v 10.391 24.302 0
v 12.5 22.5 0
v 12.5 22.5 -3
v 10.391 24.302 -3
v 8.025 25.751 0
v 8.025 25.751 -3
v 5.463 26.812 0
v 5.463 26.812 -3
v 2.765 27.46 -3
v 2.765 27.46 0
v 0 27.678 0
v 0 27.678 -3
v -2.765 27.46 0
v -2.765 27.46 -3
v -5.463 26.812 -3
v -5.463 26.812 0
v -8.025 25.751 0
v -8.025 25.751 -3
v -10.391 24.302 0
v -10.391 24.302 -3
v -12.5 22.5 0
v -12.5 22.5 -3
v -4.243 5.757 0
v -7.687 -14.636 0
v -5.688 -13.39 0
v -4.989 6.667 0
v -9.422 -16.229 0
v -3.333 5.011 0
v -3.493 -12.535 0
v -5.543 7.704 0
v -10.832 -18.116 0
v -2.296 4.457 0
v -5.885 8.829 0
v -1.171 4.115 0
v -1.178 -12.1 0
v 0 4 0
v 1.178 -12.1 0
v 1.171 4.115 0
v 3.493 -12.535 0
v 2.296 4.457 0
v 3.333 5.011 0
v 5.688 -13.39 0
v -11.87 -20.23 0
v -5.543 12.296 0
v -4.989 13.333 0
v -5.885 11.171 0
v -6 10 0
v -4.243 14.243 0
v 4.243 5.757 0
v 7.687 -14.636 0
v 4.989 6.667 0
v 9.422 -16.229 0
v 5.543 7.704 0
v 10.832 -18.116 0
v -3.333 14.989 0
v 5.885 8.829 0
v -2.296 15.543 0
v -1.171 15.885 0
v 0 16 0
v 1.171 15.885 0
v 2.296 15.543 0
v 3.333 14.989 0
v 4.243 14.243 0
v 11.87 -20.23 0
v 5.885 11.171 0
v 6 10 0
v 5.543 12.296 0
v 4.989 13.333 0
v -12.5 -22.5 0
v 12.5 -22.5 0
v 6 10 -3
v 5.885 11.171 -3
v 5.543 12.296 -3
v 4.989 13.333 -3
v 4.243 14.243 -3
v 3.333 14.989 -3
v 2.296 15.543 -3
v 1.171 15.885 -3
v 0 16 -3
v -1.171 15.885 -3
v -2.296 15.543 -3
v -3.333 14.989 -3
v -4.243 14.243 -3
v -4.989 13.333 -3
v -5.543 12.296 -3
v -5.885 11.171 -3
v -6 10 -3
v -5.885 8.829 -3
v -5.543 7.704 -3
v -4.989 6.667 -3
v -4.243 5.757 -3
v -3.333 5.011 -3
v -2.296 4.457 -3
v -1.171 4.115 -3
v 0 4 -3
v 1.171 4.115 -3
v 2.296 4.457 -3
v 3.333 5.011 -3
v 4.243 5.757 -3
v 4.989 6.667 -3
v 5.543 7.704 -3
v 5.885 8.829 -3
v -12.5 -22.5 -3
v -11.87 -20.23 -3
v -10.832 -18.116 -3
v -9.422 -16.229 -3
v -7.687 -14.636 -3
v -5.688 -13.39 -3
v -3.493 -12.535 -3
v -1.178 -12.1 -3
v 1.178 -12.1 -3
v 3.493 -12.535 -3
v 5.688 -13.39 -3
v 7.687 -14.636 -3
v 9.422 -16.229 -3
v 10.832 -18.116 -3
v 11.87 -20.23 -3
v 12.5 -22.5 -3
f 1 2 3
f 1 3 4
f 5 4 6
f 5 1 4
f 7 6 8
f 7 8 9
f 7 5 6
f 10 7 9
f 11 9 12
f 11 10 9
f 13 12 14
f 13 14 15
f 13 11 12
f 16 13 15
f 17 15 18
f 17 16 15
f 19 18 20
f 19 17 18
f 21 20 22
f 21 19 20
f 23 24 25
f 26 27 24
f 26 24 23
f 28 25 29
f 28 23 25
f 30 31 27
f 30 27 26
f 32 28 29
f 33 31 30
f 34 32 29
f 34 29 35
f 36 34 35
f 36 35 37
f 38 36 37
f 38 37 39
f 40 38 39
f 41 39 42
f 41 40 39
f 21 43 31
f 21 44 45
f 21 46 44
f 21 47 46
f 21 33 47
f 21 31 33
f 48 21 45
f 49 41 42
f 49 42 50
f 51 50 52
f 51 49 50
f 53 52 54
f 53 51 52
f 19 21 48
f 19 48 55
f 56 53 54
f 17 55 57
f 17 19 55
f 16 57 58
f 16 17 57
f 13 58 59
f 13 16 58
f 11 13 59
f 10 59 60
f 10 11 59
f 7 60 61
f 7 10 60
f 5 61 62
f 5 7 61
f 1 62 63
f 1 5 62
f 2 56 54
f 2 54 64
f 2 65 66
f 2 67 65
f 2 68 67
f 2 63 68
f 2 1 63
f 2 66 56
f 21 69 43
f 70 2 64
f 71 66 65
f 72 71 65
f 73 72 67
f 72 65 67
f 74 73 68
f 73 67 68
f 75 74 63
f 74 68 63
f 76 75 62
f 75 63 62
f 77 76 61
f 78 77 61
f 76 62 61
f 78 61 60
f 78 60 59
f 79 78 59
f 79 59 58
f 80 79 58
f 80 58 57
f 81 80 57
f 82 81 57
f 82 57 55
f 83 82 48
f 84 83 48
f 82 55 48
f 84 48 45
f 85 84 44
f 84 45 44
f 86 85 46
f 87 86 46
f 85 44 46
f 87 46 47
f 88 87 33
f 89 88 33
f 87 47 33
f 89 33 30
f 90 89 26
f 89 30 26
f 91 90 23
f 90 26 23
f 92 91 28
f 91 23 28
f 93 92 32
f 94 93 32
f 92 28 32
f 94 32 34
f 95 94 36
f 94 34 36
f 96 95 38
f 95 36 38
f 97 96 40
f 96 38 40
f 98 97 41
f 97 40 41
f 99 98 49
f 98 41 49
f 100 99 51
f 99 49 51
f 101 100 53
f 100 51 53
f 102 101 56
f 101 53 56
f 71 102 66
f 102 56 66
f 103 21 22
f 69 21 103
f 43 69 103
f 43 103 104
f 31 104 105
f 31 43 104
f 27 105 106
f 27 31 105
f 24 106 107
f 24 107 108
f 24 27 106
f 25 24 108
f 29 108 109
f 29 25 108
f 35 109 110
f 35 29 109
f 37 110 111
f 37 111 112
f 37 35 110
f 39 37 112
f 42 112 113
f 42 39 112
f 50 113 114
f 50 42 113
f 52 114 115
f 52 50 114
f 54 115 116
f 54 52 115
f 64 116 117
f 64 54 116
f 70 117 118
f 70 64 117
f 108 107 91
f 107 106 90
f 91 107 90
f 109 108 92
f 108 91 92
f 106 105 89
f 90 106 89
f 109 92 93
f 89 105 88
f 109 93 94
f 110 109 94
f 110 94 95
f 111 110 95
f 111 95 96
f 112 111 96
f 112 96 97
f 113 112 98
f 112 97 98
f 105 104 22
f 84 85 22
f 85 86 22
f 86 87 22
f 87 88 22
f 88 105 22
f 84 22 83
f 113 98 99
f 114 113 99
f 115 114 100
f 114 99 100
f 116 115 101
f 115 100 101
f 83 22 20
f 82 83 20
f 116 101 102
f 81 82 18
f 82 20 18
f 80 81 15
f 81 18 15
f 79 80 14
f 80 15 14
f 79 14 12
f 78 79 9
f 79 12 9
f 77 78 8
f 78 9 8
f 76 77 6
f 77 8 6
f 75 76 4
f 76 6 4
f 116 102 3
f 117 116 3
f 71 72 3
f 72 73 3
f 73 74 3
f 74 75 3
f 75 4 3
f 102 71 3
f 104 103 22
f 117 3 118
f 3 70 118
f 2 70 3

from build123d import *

# Parameters (mm, degrees)
SKETCH1_R          = 6
BASE_FLANGE1_DEPTH = 3


# Sheet-metal steps are written as plain solids
with BuildPart() as part:
    # Sketch1 → Base-Flange1 (new body)
    with BuildSketch(Plane.XY):
        with BuildLine():
            Line((-12.5, 22.5), (-12.5, -22.5))
            ThreePointArc((-12.5, -22.5), (0, -12.044994432), (12.5, -22.5))
            Line((12.5, -22.5), (12.5, 22.5))
            ThreePointArc((12.5, 22.5), (0, 27.67766953), (-12.5, 22.5))
        make_face()
        with Locations((0, 10)):
            Circle(SKETCH1_R, mode=Mode.SUBTRACT)
    extrude(amount=-BASE_FLANGE1_DEPTH)


solid = part.part
